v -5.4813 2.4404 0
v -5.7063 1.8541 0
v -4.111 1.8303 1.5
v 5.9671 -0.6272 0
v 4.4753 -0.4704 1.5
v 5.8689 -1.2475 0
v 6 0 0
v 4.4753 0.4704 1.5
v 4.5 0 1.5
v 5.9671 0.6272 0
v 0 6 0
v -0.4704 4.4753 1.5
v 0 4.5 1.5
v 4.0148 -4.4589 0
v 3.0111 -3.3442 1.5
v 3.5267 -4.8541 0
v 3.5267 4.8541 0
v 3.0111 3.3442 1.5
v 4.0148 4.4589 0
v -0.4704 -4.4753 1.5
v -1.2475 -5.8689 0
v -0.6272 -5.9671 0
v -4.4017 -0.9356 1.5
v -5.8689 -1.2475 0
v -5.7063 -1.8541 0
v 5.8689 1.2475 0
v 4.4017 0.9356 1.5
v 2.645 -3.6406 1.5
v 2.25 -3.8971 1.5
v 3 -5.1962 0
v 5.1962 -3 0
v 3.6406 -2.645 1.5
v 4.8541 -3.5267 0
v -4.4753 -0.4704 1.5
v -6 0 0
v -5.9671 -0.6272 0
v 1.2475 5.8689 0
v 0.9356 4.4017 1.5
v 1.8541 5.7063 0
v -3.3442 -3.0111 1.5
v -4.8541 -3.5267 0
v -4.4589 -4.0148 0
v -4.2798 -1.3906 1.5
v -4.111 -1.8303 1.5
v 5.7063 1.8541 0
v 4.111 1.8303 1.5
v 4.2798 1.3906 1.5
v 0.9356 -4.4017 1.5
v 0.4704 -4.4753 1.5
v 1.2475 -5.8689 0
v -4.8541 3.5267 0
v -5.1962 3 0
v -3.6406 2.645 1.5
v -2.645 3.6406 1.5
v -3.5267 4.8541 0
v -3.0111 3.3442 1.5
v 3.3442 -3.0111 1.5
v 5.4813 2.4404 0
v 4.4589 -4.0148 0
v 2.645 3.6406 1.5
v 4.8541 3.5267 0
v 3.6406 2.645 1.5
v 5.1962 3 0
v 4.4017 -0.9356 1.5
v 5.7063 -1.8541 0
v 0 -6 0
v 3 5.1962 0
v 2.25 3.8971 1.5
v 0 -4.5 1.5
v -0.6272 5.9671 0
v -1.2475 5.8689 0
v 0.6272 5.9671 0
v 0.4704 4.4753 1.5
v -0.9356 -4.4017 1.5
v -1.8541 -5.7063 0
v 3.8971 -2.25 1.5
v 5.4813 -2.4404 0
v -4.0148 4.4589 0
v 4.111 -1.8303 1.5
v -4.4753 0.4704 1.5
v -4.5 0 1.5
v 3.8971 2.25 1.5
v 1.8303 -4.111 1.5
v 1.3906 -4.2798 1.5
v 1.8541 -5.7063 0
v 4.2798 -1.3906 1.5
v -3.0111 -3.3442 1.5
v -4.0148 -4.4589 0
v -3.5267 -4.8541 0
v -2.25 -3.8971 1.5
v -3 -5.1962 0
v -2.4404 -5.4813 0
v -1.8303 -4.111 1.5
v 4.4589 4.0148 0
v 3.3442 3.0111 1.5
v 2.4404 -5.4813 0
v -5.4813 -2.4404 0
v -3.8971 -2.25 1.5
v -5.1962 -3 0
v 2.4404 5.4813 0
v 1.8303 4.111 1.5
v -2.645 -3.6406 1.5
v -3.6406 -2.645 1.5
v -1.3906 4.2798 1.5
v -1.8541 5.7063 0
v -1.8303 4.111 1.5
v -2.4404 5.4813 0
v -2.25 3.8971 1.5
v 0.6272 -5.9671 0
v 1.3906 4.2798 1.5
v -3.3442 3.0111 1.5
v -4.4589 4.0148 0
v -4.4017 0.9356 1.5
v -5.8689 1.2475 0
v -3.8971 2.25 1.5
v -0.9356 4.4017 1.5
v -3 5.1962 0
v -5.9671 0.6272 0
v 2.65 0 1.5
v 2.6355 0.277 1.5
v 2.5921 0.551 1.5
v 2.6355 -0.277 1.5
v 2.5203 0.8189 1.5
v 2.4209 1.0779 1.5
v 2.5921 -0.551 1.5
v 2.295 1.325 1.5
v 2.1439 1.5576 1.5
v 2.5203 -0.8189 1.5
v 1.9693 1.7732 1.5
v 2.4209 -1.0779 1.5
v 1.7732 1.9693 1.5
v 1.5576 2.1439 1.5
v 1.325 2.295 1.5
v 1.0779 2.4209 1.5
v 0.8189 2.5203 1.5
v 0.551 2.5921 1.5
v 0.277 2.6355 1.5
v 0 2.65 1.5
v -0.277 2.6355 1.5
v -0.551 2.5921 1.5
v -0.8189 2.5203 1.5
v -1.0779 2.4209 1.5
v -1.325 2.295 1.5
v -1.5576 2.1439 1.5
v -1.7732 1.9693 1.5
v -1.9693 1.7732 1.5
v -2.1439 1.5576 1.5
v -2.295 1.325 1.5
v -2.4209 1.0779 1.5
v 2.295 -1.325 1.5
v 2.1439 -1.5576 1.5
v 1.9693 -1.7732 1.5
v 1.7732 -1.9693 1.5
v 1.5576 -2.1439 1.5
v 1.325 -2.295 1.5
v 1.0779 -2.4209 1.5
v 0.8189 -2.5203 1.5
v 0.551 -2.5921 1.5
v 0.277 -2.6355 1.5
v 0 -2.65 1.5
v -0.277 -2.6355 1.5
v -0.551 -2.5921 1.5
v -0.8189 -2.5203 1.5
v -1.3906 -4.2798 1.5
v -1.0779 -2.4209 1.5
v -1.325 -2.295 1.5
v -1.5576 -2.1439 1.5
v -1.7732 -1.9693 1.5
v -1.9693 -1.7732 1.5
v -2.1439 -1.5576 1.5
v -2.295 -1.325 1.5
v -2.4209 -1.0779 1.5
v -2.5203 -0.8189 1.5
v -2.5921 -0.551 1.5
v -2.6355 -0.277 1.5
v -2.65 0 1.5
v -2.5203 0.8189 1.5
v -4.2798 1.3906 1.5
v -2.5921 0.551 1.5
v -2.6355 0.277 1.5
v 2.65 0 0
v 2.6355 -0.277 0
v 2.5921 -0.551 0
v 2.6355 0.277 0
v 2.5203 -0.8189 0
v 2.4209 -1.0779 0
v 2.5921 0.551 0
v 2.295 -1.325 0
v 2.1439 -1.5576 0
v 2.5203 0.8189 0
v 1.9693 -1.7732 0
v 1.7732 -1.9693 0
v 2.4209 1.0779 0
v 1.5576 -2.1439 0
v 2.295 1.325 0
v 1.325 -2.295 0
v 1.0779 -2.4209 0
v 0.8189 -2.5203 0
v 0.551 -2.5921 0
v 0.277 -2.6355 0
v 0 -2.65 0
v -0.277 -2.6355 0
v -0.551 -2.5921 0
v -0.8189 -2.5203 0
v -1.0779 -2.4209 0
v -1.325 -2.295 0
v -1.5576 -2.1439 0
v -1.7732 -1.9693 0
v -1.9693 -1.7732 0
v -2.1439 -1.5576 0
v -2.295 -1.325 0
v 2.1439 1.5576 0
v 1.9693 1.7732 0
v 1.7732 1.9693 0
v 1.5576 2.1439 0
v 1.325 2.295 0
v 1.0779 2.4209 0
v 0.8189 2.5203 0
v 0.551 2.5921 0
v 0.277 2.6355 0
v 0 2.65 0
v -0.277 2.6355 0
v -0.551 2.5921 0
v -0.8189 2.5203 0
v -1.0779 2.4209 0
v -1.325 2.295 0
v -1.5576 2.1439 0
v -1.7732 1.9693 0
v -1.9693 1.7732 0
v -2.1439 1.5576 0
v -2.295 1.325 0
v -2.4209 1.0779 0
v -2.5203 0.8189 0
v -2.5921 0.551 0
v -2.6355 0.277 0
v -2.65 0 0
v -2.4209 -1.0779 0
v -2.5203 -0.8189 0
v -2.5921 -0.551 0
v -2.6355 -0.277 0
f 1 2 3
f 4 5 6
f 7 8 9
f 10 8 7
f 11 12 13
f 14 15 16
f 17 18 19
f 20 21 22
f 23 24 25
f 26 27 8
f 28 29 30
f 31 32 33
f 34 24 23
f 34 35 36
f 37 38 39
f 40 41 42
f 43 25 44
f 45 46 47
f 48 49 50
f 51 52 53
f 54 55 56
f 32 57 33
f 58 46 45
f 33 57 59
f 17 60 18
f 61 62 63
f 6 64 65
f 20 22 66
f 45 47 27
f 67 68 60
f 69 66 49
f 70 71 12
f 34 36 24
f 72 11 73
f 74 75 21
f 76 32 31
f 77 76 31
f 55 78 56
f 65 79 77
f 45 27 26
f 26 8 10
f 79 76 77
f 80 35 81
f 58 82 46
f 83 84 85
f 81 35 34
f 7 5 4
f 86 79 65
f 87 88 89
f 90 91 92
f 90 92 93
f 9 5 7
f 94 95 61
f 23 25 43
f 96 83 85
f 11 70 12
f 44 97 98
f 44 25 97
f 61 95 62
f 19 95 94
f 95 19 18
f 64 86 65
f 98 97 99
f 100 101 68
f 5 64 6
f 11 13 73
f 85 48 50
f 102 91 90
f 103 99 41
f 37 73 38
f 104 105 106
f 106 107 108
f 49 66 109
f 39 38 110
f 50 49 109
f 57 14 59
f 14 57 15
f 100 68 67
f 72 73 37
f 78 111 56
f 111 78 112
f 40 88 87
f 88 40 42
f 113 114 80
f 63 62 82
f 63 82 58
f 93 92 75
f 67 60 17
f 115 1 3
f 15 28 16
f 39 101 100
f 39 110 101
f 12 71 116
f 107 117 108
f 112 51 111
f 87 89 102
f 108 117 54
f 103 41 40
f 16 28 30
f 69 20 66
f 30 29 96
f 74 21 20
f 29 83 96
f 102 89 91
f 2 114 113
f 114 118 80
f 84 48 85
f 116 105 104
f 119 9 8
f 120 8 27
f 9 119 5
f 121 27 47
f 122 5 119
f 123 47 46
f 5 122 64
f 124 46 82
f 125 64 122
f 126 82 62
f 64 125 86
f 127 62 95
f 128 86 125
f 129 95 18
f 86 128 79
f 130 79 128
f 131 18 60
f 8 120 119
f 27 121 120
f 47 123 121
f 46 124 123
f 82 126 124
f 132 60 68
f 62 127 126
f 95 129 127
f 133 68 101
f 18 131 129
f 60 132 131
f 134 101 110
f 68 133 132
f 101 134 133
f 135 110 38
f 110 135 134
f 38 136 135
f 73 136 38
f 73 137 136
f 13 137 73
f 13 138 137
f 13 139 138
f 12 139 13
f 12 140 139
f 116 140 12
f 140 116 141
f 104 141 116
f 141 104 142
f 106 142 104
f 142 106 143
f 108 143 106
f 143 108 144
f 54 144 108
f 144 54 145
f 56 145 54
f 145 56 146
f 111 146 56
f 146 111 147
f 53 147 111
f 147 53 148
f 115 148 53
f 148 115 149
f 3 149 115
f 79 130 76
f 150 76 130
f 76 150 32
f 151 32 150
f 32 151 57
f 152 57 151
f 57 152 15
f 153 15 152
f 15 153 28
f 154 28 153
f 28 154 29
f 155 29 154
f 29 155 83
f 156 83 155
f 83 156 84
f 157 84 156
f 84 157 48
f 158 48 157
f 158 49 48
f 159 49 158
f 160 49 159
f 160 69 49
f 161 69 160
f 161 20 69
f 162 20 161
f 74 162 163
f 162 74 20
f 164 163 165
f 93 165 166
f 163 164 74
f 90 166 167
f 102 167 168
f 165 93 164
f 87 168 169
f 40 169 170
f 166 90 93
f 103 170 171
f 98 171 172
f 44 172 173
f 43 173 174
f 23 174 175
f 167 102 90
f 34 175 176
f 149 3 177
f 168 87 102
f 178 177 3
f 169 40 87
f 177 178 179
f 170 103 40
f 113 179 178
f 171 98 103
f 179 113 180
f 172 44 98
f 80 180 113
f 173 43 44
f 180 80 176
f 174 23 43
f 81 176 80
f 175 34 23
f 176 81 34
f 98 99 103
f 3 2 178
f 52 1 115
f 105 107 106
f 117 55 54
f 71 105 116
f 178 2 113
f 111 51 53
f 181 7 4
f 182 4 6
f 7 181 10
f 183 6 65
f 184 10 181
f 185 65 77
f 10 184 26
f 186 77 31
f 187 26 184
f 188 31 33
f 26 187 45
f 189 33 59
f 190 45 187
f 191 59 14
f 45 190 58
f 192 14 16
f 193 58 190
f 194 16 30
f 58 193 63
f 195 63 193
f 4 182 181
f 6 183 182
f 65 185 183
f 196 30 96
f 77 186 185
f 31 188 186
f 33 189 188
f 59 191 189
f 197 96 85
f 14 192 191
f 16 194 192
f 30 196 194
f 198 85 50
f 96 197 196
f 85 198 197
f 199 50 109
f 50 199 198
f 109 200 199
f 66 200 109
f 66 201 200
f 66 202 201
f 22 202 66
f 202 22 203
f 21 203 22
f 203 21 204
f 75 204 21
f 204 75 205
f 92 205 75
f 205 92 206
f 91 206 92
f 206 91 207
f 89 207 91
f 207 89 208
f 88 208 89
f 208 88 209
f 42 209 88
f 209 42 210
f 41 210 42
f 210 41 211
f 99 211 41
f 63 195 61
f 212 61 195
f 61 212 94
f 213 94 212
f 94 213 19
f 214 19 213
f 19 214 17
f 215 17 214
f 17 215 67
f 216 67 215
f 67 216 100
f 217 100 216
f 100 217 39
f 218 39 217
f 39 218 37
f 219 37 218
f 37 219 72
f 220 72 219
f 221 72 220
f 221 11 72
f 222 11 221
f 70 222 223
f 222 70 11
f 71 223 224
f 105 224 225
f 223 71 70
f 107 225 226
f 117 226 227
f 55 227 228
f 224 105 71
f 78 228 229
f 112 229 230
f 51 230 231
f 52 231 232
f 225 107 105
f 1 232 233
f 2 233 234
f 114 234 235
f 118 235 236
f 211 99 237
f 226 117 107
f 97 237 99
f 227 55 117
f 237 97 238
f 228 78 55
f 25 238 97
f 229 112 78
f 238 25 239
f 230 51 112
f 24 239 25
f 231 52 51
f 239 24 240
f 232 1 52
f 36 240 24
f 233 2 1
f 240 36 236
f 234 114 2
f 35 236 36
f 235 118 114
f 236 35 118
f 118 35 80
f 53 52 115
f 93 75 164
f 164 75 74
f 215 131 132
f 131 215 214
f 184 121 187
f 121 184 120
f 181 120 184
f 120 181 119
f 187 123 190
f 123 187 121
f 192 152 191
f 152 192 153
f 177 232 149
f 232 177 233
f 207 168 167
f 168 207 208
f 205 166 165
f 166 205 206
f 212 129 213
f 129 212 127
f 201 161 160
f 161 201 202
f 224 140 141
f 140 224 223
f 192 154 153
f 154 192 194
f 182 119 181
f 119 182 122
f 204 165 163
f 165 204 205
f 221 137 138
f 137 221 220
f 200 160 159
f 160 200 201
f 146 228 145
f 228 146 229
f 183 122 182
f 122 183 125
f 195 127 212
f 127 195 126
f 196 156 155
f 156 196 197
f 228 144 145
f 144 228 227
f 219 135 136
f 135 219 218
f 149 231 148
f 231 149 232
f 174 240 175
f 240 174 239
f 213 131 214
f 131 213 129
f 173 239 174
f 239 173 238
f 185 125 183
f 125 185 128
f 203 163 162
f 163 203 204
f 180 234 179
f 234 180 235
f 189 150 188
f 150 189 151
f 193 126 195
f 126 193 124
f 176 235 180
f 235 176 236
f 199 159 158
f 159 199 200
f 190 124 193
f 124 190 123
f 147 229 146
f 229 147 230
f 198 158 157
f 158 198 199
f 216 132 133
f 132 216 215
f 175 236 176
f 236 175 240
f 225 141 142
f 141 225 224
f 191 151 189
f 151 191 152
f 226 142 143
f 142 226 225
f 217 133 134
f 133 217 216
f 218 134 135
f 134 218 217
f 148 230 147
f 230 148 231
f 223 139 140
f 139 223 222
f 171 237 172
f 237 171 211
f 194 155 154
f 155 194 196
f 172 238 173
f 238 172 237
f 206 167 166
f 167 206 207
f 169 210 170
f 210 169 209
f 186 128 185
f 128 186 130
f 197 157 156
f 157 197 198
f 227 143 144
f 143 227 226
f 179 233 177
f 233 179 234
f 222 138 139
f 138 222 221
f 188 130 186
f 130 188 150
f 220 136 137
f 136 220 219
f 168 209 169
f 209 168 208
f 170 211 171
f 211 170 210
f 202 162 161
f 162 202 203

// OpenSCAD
// Conical spring washer.
$fn = 60;
eps = 0.02;
inner_d = 5.3;
outer_d = 12;
thickness = 1.5;
difference() {
    cylinder(d1=outer_d,d2=outer_d-2*thickness,h=thickness);
    translate([0,0,-eps]) cylinder(d=inner_d,h=thickness+2*eps);
}
